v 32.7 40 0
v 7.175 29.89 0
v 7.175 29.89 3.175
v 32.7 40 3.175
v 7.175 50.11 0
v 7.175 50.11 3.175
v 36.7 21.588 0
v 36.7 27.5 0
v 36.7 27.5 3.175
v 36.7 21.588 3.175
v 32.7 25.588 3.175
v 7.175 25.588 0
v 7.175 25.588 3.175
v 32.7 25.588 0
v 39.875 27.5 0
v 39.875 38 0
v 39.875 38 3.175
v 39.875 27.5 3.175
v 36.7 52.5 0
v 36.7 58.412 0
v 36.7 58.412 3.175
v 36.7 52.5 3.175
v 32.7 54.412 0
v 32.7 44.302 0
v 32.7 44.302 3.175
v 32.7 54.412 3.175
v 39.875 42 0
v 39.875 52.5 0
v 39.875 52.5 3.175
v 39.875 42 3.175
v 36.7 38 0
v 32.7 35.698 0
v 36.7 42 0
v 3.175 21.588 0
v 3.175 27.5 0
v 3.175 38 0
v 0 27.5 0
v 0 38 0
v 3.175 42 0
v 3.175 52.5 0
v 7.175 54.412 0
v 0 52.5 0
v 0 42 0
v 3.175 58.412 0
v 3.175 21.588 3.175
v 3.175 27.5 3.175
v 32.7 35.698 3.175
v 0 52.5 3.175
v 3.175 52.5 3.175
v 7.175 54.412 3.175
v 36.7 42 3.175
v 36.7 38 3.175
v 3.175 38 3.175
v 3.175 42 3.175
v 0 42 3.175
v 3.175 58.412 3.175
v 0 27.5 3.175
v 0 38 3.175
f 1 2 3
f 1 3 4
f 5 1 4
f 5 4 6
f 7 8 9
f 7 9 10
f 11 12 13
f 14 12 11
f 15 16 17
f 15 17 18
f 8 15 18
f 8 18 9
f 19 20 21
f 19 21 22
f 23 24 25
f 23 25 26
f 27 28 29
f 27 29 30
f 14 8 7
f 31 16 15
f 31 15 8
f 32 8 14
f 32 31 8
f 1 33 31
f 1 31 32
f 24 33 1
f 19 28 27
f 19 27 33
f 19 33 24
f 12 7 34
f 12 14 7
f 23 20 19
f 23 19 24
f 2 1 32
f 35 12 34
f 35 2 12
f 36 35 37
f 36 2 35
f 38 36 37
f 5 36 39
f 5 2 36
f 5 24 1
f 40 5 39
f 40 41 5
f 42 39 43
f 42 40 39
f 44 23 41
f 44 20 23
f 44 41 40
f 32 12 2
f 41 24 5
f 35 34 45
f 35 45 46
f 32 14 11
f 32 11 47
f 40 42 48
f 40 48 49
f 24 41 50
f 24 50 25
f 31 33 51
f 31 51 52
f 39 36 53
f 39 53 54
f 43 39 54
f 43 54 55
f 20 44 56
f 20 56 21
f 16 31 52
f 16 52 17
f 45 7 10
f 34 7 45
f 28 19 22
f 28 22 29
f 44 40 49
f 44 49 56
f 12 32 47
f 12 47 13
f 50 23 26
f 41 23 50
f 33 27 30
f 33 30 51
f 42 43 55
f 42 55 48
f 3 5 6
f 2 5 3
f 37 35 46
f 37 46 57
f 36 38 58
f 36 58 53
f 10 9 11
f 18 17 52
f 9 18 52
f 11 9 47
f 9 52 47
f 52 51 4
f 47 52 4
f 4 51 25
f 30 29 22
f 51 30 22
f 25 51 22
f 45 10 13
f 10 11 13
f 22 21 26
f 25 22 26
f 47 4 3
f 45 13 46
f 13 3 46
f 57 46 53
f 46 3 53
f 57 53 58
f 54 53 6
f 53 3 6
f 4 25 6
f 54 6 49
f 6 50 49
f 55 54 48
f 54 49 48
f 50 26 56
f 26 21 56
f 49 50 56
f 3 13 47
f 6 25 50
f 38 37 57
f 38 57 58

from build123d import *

# Parameters (mm, degrees)
BOSS_EXTRUDE1_DEPTH = 3.175


with BuildPart() as part:
    # Sketch1 → Boss-Extrude1 (new body)
    with BuildSketch(Plane.XY):
        Polygon((3.175, 27.5), (0, 27.5), (0, 38), (3.175, 38), (3.175, 42), (0, 42), (0, 52.5), (3.175, 52.5), (3.175, 58.4125), (36.7, 58.4125), (36.7, 52.5), (39.875, 52.5), (39.875, 42), (36.7, 42), (36.7, 38), (39.875, 38), (39.875, 27.5), (36.7, 27.5), (36.7, 21.5875), (3.175, 21.5875), align=None)
        Polygon((32.7, 40), (7.175, 50.110154656), (7.175, 29.889845344), align=None, mode=Mode.SUBTRACT)
        Polygon((32.7, 54.4125), (7.175, 54.4125), (32.7, 44.302345344), align=None, mode=Mode.SUBTRACT)
        Polygon((32.7, 25.5875), (32.7, 35.697654656), (7.175, 25.5875), align=None, mode=Mode.SUBTRACT)
    extrude(amount=BOSS_EXTRUDE1_DEPTH)


solid = part.part
